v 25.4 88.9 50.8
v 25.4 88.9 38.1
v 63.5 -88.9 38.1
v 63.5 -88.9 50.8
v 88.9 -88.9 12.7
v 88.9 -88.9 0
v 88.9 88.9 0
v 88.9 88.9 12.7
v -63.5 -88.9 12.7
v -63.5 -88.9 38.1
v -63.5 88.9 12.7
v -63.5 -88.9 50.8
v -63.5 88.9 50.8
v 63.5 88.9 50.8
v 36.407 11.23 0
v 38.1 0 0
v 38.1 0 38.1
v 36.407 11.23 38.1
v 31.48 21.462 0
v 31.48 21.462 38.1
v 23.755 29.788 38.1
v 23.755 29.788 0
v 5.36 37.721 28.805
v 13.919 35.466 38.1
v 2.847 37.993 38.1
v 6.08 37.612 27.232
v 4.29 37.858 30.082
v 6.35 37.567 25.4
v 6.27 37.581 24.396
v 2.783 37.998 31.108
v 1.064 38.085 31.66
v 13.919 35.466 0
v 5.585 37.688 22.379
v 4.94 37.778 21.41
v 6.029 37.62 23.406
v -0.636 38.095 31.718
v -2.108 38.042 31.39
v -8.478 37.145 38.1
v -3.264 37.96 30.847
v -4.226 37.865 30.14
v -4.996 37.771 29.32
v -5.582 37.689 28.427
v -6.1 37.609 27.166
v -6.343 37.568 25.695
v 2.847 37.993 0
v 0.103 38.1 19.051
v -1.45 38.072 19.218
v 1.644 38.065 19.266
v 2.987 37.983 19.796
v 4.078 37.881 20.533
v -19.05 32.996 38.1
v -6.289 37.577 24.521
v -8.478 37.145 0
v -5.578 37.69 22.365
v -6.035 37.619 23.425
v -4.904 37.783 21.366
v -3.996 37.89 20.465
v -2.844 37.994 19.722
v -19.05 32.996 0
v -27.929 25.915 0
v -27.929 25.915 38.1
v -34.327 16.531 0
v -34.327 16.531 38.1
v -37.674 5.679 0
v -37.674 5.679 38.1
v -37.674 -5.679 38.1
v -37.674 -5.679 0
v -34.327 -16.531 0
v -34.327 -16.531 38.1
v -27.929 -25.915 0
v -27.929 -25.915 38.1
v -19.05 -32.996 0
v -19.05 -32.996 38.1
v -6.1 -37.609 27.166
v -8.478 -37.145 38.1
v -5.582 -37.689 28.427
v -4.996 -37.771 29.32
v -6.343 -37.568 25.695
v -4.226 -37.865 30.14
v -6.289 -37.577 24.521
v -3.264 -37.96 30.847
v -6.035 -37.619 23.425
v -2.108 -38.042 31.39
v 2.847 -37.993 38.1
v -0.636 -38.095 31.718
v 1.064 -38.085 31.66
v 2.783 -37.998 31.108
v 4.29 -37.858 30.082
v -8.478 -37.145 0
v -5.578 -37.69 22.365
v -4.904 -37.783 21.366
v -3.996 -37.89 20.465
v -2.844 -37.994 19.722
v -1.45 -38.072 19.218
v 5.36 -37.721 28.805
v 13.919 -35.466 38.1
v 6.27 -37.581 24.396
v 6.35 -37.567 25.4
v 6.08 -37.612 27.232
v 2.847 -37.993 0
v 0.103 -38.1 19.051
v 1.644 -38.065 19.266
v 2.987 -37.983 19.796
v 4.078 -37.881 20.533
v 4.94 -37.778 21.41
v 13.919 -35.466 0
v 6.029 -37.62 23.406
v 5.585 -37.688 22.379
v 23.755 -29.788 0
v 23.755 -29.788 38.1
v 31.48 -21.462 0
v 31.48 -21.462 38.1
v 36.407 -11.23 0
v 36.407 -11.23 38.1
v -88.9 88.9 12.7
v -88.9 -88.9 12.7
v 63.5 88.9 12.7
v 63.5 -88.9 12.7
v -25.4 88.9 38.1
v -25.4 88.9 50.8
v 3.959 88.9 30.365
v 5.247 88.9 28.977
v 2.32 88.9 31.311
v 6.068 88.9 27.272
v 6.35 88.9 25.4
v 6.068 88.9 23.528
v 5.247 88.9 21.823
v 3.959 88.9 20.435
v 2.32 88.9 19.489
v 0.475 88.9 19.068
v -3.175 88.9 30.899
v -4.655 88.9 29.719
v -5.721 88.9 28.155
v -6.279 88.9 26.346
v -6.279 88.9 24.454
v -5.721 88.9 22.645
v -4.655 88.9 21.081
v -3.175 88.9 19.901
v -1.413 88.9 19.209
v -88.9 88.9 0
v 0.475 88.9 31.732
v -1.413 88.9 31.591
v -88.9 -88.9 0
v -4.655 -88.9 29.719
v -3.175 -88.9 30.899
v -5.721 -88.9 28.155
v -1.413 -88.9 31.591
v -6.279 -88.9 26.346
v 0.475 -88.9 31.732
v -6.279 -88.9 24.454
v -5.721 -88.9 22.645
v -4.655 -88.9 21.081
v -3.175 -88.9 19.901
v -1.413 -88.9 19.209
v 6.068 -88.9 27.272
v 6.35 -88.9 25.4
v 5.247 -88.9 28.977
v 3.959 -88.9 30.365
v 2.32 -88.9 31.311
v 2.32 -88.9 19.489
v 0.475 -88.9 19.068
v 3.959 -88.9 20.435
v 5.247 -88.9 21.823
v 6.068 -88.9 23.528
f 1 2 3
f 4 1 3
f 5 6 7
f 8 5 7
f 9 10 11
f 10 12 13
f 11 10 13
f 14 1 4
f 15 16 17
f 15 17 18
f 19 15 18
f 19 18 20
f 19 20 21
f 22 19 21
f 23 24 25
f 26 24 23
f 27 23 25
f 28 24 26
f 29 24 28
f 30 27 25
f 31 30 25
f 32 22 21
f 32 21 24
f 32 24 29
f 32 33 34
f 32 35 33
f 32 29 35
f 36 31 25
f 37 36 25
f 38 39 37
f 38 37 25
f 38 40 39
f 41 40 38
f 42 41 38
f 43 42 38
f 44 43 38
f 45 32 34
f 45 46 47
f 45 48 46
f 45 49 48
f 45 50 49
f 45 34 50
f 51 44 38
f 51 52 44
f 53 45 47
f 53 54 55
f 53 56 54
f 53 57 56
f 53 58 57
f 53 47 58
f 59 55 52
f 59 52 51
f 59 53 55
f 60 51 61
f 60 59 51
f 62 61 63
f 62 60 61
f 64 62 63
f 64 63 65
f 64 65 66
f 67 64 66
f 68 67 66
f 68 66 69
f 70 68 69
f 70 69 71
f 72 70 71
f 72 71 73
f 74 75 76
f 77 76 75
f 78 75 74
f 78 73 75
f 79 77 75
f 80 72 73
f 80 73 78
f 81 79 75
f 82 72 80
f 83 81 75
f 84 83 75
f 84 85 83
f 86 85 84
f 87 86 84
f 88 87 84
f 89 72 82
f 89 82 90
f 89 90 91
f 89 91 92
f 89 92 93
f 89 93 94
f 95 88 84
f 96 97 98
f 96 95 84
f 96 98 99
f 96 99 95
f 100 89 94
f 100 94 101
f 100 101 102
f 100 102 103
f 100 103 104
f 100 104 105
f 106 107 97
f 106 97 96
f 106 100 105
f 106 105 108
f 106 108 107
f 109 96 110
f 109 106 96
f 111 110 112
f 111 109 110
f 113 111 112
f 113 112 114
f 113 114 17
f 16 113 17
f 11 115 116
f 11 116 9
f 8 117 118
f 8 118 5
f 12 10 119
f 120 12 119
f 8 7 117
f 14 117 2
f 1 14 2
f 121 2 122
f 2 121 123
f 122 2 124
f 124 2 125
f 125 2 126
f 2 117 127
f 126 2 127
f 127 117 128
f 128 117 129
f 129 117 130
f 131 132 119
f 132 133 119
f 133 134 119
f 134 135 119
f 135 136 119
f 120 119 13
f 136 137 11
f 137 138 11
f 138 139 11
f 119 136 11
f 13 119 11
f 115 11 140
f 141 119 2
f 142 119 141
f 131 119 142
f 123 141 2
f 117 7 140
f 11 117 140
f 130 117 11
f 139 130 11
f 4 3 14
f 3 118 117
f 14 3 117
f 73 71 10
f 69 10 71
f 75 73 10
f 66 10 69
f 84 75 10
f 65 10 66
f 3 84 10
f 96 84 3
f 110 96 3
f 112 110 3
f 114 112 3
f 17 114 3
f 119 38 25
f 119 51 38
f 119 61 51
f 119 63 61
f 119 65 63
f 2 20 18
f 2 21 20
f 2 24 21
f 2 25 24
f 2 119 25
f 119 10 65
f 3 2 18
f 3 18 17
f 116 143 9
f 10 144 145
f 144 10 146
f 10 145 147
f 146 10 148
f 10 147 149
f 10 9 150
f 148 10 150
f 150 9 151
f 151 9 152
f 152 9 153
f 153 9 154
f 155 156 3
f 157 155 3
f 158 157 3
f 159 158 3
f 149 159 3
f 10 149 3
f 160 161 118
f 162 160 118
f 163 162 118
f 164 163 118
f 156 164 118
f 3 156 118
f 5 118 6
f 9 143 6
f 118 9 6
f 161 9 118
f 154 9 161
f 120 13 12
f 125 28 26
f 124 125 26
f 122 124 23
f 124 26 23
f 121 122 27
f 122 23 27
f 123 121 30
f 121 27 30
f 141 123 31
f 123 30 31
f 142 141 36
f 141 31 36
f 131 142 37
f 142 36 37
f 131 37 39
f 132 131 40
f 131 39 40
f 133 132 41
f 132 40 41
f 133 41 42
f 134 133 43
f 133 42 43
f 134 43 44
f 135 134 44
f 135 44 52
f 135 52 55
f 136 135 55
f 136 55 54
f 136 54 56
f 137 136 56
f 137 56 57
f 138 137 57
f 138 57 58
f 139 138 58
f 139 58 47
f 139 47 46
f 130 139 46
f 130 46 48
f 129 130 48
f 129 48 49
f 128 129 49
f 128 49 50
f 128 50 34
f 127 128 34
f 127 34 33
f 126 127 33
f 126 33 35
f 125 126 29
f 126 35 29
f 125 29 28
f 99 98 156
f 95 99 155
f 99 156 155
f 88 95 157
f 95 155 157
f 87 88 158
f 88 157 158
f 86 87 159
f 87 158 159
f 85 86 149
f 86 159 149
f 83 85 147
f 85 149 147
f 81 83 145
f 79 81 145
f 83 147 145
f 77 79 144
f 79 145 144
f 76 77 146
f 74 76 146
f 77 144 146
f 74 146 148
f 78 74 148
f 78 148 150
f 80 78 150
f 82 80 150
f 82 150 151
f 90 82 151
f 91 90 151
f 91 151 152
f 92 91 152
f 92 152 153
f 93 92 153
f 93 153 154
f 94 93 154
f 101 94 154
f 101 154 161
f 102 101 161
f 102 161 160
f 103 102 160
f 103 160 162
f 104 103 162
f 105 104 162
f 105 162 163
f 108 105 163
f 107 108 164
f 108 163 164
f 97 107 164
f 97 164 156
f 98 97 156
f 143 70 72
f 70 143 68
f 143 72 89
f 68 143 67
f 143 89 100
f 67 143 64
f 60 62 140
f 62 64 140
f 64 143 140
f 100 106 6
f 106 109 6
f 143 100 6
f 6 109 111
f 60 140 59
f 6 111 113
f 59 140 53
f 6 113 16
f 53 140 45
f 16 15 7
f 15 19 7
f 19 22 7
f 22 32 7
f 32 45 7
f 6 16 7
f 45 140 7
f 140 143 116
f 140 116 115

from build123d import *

# Parameters (mm, degrees)
F0_W     = 177.8
F0_H     = 177.8
F0_R     = 38.1
F1_DEPTH = 38.1
F2_W     = 25.4
F2_H     = 177.8
F3_DEPTH = 25.4
F4_R     = 6.35
F5_DEPTH = 177.801
F7_DEPTH = 12.7


with BuildPart() as f1:
    # F0 (on Top) → F1 (new body)
    with BuildSketch(Plane.XY):
        Rectangle(F0_W, F0_H)
        Circle(F0_R, mode=Mode.SUBTRACT)
    extrude(amount=F1_DEPTH)

    # F2 (on face) → F3 (cut)
    with BuildSketch(Plane.XY.offset(38.1)):
        with Locations((-76.2, 0)):
            Rectangle(F2_W, F2_H)
        with Locations((76.2, 0)):
            Rectangle(F2_W, F2_H)
    extrude(amount=-F3_DEPTH, mode=Mode.SUBTRACT)

    # F4 (on face) → F5 (cut, through all)
    with BuildSketch(Plane.XZ.offset(88.9)):
        with Locations((0, 25.4)):
            Circle(F4_R)
    extrude(amount=-F5_DEPTH, mode=Mode.SUBTRACT)

    # F6 (on face) → F7 (join)
    with BuildSketch(Plane.XY.offset(38.1)):
        Polygon((63.5, 88.9), (25.4, 88.9), (63.5, -88.9), align=None)
        Polygon((-63.5, -88.9), (-25.4, 88.9), (-63.5, 88.9), align=None)
    extrude(amount=F7_DEPTH)


solid = f1.part
